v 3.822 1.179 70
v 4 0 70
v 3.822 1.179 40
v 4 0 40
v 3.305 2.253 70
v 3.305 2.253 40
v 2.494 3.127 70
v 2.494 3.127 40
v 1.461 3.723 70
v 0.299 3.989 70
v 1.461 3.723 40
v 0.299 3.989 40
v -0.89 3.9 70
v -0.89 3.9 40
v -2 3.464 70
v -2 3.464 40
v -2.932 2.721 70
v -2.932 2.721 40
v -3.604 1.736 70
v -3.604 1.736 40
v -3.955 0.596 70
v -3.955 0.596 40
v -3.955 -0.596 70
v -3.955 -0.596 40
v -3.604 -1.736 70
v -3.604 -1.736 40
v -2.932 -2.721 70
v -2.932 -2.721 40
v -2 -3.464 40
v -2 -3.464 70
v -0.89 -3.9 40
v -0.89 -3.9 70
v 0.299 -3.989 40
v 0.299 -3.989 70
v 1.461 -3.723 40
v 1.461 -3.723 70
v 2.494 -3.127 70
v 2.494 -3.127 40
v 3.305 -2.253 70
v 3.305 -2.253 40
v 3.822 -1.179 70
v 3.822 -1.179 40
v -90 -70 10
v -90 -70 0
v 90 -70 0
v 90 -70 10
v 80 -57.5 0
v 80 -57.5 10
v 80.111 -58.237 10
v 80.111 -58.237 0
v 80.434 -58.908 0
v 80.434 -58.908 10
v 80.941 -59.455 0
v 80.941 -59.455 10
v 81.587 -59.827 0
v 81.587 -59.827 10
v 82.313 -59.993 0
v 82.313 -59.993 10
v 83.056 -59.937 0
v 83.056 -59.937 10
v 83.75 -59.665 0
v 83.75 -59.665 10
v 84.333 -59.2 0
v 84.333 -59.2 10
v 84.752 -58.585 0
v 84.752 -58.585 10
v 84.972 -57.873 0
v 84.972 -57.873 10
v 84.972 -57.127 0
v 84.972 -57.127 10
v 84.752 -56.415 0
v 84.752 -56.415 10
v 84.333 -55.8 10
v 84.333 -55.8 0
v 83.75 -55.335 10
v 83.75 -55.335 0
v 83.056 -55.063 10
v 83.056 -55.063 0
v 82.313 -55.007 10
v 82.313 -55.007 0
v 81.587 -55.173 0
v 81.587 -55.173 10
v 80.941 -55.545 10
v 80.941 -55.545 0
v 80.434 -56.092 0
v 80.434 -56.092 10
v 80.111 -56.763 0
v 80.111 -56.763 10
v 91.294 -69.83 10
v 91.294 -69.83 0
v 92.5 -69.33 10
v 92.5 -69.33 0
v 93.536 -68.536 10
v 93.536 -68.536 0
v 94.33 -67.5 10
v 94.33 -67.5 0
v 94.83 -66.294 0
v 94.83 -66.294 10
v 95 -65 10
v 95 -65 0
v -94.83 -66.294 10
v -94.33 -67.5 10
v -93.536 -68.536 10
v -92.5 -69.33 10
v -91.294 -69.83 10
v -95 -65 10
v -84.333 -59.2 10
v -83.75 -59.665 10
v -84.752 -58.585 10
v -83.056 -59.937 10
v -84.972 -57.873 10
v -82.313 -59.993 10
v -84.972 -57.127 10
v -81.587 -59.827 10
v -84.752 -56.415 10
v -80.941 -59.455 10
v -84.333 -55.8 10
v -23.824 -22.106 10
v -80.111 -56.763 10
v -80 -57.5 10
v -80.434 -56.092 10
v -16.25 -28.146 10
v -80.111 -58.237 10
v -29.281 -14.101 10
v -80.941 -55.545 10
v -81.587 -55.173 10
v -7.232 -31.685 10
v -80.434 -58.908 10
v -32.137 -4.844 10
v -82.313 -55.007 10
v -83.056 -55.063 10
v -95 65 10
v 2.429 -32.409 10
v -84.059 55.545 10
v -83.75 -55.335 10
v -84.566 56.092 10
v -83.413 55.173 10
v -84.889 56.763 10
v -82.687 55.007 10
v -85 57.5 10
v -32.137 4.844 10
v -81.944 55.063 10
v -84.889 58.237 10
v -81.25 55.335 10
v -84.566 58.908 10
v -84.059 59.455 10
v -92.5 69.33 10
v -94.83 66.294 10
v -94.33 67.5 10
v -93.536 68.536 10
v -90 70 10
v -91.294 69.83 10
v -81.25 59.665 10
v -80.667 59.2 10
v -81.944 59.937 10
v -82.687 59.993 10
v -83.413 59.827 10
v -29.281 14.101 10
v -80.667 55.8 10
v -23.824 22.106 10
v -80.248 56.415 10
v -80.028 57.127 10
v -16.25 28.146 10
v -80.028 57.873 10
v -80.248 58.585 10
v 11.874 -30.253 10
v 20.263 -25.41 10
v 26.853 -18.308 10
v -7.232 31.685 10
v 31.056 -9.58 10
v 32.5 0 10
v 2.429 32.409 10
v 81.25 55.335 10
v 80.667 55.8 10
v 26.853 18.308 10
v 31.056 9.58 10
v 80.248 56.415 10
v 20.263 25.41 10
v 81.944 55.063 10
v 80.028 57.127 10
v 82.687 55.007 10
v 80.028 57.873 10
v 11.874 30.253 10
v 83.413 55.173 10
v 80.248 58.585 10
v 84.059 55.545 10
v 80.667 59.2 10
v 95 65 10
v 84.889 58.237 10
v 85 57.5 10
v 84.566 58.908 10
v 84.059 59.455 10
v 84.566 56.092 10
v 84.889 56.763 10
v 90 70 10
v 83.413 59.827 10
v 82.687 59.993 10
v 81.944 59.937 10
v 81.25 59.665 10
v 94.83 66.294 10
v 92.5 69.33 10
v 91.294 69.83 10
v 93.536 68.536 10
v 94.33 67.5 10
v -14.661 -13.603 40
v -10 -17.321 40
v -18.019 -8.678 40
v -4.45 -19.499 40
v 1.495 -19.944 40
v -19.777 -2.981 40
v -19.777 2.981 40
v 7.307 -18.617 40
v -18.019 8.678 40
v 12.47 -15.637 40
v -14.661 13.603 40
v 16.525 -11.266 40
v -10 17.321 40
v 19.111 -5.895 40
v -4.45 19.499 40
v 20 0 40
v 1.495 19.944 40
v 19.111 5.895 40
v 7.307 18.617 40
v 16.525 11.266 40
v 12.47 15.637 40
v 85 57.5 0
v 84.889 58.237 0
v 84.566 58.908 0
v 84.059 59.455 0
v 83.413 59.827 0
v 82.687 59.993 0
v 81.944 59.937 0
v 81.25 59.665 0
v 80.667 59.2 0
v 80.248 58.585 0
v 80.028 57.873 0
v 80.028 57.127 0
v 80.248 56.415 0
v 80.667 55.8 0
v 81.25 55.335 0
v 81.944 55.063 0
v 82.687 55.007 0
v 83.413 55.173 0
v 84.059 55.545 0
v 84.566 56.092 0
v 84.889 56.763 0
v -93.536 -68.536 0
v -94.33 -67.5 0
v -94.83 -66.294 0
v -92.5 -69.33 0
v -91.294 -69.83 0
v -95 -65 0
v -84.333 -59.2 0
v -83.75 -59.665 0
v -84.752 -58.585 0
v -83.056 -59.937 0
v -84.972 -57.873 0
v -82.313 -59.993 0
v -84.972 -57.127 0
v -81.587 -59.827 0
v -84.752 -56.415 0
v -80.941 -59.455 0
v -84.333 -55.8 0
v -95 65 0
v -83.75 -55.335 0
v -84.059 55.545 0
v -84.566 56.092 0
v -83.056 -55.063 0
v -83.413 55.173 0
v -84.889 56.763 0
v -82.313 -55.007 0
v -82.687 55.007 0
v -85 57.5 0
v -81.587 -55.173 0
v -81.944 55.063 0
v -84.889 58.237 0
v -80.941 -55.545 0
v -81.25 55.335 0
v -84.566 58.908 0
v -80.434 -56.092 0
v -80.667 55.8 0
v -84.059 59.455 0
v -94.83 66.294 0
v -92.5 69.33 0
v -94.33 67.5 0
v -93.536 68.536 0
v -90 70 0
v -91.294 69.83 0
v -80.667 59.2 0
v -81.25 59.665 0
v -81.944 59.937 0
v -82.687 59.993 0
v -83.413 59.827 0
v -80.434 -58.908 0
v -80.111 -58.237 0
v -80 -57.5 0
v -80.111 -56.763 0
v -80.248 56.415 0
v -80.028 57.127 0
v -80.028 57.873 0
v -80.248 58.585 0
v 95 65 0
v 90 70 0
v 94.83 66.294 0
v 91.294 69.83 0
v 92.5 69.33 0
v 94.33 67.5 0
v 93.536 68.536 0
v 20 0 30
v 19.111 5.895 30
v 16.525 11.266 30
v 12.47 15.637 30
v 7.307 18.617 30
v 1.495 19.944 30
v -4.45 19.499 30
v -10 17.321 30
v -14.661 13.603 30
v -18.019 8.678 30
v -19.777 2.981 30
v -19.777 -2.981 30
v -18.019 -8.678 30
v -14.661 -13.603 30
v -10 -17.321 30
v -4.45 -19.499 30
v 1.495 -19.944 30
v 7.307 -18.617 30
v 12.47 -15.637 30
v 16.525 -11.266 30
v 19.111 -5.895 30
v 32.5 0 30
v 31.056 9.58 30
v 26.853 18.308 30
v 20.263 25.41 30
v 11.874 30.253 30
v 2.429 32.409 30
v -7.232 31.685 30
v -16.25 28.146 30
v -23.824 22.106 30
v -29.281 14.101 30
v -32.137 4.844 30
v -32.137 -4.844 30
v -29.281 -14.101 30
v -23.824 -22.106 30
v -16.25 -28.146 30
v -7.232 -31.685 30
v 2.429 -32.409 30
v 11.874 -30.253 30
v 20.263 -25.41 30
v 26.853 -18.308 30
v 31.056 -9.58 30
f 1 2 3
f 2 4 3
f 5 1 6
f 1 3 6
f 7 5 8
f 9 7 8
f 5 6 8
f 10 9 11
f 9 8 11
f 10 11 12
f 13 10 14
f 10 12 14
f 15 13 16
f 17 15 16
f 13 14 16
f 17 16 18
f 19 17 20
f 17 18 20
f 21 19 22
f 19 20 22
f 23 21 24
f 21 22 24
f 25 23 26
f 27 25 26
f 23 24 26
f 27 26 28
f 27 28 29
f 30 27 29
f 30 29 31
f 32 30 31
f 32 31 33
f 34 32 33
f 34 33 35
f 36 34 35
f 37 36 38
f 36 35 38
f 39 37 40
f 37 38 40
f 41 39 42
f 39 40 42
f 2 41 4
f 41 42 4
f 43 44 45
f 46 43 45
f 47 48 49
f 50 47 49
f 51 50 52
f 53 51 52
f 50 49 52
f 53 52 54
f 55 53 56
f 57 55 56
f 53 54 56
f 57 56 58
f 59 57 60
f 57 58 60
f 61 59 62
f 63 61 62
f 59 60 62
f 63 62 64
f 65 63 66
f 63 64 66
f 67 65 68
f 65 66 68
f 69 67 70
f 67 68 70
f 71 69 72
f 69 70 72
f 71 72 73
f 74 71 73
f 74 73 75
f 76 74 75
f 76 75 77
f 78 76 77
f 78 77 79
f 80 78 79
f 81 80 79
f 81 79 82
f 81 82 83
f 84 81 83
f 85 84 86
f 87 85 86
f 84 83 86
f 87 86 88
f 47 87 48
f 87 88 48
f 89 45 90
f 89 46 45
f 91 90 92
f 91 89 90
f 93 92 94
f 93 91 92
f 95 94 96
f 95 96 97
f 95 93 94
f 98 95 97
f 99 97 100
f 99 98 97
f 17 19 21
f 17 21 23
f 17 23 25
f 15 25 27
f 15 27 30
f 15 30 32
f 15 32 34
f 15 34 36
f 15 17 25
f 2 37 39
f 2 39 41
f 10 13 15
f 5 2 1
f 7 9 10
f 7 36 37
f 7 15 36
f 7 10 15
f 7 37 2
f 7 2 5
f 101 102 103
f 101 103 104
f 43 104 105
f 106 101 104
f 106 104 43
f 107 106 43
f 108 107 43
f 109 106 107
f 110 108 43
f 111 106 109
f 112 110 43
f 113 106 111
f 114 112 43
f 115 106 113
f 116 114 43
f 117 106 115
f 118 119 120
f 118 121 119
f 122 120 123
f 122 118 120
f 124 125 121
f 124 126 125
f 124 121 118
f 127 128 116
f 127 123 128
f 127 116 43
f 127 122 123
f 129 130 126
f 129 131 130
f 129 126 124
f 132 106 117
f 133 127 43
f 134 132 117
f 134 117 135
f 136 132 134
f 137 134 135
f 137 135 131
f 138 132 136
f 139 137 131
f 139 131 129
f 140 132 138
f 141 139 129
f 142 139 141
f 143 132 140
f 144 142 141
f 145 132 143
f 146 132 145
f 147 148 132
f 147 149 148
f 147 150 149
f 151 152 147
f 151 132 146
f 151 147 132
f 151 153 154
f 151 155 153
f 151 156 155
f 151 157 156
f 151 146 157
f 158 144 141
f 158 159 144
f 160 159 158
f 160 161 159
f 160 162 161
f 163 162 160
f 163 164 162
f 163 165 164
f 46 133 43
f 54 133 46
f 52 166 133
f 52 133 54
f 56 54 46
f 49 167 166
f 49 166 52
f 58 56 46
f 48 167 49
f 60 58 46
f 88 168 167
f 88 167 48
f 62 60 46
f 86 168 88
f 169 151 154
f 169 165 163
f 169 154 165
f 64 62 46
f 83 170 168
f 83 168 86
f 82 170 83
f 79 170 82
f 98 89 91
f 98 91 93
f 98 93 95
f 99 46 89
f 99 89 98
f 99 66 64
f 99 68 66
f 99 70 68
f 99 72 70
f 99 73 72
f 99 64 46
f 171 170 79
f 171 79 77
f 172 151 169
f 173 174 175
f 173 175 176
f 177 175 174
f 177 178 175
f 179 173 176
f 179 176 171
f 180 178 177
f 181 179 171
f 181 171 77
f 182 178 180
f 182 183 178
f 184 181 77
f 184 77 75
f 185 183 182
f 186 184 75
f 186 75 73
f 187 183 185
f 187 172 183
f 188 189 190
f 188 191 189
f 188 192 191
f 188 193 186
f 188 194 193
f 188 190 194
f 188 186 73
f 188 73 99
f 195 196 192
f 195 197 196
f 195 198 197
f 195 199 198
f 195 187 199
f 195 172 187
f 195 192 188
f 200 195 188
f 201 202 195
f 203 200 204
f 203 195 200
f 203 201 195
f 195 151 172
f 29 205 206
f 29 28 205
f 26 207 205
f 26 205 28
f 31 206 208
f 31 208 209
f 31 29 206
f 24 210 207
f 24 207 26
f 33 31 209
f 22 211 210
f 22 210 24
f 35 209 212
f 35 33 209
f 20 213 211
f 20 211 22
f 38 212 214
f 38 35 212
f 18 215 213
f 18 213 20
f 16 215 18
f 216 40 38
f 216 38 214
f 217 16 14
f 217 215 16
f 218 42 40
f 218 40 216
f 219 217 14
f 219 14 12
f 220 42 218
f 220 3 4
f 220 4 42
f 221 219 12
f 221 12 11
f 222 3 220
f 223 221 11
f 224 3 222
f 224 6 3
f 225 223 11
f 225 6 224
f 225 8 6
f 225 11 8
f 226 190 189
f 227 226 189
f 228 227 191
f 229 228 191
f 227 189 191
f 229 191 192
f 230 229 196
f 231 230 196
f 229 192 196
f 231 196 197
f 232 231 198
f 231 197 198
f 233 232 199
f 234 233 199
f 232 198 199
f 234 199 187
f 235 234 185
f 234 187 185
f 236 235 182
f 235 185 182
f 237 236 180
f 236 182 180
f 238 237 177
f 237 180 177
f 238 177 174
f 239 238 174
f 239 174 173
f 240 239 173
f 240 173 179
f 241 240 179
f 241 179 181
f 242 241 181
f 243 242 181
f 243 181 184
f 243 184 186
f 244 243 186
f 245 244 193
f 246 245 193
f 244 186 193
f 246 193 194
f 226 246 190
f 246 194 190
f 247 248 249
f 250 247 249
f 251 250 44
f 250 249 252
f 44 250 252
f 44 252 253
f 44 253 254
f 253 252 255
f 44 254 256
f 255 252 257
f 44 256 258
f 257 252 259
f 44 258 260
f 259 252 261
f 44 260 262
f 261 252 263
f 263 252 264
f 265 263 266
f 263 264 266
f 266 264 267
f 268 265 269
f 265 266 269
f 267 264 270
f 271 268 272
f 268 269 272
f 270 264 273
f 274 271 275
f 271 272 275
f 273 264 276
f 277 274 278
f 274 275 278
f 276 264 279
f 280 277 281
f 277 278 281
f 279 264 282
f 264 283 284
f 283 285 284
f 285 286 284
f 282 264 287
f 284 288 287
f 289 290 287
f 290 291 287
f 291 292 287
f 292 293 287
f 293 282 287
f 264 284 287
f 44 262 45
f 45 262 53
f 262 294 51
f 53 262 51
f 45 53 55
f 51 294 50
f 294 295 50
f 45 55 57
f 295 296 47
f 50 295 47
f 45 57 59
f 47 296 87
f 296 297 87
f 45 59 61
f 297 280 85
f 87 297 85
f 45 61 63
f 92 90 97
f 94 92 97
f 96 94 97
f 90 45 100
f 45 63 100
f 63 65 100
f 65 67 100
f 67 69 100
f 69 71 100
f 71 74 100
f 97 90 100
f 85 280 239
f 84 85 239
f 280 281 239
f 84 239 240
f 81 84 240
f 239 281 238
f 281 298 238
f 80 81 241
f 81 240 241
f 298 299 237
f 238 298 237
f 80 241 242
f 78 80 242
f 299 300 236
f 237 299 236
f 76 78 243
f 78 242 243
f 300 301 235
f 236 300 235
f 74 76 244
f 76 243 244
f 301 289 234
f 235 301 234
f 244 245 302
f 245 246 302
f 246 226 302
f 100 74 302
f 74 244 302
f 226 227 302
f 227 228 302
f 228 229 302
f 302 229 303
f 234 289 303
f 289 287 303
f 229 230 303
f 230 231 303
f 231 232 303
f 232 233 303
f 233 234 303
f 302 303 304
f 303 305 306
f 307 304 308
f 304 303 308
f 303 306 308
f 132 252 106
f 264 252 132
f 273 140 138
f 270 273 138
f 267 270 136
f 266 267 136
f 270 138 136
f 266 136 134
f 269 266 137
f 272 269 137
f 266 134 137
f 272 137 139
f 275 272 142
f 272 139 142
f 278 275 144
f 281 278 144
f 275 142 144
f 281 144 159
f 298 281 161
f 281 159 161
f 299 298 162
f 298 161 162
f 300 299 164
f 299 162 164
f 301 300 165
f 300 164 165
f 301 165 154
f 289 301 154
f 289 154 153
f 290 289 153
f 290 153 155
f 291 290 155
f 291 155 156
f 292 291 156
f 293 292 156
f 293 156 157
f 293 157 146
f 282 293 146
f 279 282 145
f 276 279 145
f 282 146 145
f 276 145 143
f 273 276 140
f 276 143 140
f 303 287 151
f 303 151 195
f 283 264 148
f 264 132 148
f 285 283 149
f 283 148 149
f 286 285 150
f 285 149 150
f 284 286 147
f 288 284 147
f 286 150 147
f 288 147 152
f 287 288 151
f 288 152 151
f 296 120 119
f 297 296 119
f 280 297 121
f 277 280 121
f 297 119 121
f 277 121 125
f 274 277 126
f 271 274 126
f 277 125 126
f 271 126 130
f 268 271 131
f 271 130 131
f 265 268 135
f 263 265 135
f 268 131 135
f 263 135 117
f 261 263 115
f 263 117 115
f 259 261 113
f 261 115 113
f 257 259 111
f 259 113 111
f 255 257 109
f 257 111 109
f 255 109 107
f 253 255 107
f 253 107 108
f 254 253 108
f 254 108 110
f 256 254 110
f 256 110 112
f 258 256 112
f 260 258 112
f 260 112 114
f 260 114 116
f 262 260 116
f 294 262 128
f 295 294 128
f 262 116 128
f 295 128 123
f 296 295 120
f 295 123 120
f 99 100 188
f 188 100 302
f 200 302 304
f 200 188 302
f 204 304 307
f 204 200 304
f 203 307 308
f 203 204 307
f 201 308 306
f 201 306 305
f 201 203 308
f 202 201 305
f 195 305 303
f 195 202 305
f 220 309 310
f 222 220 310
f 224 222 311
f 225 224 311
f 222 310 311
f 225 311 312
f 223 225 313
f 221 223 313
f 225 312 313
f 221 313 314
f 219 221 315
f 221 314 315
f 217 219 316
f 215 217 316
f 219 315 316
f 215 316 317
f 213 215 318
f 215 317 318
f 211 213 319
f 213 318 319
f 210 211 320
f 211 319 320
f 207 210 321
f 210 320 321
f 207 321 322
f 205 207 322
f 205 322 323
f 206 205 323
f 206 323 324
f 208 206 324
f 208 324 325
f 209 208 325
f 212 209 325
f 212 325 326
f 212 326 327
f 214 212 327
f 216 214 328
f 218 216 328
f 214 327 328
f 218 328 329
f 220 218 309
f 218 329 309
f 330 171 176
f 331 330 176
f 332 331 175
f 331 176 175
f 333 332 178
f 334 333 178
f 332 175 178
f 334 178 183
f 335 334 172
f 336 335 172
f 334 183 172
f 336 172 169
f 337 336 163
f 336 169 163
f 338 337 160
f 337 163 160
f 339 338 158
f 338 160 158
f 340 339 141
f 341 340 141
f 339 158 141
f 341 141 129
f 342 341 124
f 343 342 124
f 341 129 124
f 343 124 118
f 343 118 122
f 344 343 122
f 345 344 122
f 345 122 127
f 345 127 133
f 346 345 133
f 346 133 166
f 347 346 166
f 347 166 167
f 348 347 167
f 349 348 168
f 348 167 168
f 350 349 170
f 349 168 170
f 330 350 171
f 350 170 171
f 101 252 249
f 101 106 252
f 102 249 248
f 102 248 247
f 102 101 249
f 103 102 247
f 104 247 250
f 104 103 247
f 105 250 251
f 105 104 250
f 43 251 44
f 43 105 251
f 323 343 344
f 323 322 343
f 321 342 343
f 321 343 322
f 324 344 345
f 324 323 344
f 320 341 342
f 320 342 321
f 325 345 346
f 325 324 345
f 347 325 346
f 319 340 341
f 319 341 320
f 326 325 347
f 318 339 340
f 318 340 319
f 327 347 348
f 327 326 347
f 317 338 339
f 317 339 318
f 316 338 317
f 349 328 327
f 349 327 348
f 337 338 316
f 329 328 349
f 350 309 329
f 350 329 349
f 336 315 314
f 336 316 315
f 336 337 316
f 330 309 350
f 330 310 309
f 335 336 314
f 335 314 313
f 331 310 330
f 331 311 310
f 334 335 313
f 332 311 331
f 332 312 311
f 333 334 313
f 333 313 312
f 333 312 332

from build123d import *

# Parameters (mm, degrees)
SKETCH_1_W          = 190
SKETCH_1_H          = 140
EXTRUDE_1_DEPTH     = 10
FILLET_1_R          = 5
SKETCH_2_R          = 32.5
EXTRUDE_2_DEPTH     = 20
SKETCH_3_R          = 20
EXTRUDE_3_DEPTH     = 10
SKETCH_4_R          = 10
EXTRUDE_4_DEPTH     = 20
CUT_EXTRUDE_START   = -10
SKETCH_5_R          = 10
SKETCH_5_R_2        = 4
CUT_EXTRUDE_1_DEPTH = 10
SKETCH_6_R          = 10
SKETCH_6_R_2        = 4
CUT_EXTRUDE_2_DEPTH = 10
SKETCH_7_R          = 4
EXTRUDE_5_DEPTH     = 10
SKETCH_8_R          = 2.5
CUT_EXTRUDE_3_DEPTH = 10


with BuildPart() as part:
    # 草图1 → 凸台-拉伸1 (new body)
    with BuildSketch(Plane.XY):
        Rectangle(SKETCH_1_W, SKETCH_1_H)
    extrude(amount=EXTRUDE_1_DEPTH)

    # 圆角1
    fillet_1_edges = [part.edges().sort_by_distance(p)[0] for p in [
        (-95, -70, 5),
        (-95, 70, 5),
        (95, 70, 5),
        (95, -70, 5),
    ]]
    fillet(fillet_1_edges, radius=FILLET_1_R)

    # 草图2 → 凸台-拉伸2 (add)
    with BuildSketch(Plane.XY.offset(10)):
        Circle(SKETCH_2_R)
    extrude(amount=EXTRUDE_2_DEPTH)

    # 草图3 → 凸台-拉伸3 (add)
    with BuildSketch(Plane.XY.offset(30)):
        Circle(SKETCH_3_R)
    extrude(amount=EXTRUDE_3_DEPTH)

    # 草图4 → 凸台-拉伸4 (add)
    with BuildSketch(Plane.XY.offset(40)):
        Circle(SKETCH_4_R)
    extrude(amount=EXTRUDE_4_DEPTH)

    # 草图5 → 切除-拉伸1 (cut)
    with BuildSketch(Plane.XY.offset(60).offset(CUT_EXTRUDE_START)):
        Circle(SKETCH_5_R)
        Circle(SKETCH_5_R_2, mode=Mode.SUBTRACT)
    extrude(amount=CUT_EXTRUDE_1_DEPTH, mode=Mode.SUBTRACT)

    # 草图6 → 切除-拉伸2 (cut)
    with BuildSketch(Plane.XY.offset(50).offset(CUT_EXTRUDE_START)):
        Circle(SKETCH_6_R)
        Circle(SKETCH_6_R_2, mode=Mode.SUBTRACT)
    extrude(amount=CUT_EXTRUDE_2_DEPTH, mode=Mode.SUBTRACT)

    # 草图7 → 凸台-拉伸5 (add)
    with BuildSketch(Plane.XY.offset(60)):
        Circle(SKETCH_7_R)
    extrude(amount=EXTRUDE_5_DEPTH)

    # 草图8 → 切除-拉伸3 (cut)
    with BuildSketch(Plane.XY.offset(10)):
        with Locations((82.5, 57.5)):
            Circle(SKETCH_8_R)
        with Locations(Location((82.5, -57.5, 0), (0, 0, 180))):
            Circle(SKETCH_8_R)
        with Locations((-82.5, -57.5)):
            Circle(SKETCH_8_R)
        with Locations(Location((-82.5, 57.5, 0), (0, 0, 180))):
            Circle(SKETCH_8_R)
    extrude(amount=-CUT_EXTRUDE_3_DEPTH, mode=Mode.SUBTRACT)


solid = part.part
